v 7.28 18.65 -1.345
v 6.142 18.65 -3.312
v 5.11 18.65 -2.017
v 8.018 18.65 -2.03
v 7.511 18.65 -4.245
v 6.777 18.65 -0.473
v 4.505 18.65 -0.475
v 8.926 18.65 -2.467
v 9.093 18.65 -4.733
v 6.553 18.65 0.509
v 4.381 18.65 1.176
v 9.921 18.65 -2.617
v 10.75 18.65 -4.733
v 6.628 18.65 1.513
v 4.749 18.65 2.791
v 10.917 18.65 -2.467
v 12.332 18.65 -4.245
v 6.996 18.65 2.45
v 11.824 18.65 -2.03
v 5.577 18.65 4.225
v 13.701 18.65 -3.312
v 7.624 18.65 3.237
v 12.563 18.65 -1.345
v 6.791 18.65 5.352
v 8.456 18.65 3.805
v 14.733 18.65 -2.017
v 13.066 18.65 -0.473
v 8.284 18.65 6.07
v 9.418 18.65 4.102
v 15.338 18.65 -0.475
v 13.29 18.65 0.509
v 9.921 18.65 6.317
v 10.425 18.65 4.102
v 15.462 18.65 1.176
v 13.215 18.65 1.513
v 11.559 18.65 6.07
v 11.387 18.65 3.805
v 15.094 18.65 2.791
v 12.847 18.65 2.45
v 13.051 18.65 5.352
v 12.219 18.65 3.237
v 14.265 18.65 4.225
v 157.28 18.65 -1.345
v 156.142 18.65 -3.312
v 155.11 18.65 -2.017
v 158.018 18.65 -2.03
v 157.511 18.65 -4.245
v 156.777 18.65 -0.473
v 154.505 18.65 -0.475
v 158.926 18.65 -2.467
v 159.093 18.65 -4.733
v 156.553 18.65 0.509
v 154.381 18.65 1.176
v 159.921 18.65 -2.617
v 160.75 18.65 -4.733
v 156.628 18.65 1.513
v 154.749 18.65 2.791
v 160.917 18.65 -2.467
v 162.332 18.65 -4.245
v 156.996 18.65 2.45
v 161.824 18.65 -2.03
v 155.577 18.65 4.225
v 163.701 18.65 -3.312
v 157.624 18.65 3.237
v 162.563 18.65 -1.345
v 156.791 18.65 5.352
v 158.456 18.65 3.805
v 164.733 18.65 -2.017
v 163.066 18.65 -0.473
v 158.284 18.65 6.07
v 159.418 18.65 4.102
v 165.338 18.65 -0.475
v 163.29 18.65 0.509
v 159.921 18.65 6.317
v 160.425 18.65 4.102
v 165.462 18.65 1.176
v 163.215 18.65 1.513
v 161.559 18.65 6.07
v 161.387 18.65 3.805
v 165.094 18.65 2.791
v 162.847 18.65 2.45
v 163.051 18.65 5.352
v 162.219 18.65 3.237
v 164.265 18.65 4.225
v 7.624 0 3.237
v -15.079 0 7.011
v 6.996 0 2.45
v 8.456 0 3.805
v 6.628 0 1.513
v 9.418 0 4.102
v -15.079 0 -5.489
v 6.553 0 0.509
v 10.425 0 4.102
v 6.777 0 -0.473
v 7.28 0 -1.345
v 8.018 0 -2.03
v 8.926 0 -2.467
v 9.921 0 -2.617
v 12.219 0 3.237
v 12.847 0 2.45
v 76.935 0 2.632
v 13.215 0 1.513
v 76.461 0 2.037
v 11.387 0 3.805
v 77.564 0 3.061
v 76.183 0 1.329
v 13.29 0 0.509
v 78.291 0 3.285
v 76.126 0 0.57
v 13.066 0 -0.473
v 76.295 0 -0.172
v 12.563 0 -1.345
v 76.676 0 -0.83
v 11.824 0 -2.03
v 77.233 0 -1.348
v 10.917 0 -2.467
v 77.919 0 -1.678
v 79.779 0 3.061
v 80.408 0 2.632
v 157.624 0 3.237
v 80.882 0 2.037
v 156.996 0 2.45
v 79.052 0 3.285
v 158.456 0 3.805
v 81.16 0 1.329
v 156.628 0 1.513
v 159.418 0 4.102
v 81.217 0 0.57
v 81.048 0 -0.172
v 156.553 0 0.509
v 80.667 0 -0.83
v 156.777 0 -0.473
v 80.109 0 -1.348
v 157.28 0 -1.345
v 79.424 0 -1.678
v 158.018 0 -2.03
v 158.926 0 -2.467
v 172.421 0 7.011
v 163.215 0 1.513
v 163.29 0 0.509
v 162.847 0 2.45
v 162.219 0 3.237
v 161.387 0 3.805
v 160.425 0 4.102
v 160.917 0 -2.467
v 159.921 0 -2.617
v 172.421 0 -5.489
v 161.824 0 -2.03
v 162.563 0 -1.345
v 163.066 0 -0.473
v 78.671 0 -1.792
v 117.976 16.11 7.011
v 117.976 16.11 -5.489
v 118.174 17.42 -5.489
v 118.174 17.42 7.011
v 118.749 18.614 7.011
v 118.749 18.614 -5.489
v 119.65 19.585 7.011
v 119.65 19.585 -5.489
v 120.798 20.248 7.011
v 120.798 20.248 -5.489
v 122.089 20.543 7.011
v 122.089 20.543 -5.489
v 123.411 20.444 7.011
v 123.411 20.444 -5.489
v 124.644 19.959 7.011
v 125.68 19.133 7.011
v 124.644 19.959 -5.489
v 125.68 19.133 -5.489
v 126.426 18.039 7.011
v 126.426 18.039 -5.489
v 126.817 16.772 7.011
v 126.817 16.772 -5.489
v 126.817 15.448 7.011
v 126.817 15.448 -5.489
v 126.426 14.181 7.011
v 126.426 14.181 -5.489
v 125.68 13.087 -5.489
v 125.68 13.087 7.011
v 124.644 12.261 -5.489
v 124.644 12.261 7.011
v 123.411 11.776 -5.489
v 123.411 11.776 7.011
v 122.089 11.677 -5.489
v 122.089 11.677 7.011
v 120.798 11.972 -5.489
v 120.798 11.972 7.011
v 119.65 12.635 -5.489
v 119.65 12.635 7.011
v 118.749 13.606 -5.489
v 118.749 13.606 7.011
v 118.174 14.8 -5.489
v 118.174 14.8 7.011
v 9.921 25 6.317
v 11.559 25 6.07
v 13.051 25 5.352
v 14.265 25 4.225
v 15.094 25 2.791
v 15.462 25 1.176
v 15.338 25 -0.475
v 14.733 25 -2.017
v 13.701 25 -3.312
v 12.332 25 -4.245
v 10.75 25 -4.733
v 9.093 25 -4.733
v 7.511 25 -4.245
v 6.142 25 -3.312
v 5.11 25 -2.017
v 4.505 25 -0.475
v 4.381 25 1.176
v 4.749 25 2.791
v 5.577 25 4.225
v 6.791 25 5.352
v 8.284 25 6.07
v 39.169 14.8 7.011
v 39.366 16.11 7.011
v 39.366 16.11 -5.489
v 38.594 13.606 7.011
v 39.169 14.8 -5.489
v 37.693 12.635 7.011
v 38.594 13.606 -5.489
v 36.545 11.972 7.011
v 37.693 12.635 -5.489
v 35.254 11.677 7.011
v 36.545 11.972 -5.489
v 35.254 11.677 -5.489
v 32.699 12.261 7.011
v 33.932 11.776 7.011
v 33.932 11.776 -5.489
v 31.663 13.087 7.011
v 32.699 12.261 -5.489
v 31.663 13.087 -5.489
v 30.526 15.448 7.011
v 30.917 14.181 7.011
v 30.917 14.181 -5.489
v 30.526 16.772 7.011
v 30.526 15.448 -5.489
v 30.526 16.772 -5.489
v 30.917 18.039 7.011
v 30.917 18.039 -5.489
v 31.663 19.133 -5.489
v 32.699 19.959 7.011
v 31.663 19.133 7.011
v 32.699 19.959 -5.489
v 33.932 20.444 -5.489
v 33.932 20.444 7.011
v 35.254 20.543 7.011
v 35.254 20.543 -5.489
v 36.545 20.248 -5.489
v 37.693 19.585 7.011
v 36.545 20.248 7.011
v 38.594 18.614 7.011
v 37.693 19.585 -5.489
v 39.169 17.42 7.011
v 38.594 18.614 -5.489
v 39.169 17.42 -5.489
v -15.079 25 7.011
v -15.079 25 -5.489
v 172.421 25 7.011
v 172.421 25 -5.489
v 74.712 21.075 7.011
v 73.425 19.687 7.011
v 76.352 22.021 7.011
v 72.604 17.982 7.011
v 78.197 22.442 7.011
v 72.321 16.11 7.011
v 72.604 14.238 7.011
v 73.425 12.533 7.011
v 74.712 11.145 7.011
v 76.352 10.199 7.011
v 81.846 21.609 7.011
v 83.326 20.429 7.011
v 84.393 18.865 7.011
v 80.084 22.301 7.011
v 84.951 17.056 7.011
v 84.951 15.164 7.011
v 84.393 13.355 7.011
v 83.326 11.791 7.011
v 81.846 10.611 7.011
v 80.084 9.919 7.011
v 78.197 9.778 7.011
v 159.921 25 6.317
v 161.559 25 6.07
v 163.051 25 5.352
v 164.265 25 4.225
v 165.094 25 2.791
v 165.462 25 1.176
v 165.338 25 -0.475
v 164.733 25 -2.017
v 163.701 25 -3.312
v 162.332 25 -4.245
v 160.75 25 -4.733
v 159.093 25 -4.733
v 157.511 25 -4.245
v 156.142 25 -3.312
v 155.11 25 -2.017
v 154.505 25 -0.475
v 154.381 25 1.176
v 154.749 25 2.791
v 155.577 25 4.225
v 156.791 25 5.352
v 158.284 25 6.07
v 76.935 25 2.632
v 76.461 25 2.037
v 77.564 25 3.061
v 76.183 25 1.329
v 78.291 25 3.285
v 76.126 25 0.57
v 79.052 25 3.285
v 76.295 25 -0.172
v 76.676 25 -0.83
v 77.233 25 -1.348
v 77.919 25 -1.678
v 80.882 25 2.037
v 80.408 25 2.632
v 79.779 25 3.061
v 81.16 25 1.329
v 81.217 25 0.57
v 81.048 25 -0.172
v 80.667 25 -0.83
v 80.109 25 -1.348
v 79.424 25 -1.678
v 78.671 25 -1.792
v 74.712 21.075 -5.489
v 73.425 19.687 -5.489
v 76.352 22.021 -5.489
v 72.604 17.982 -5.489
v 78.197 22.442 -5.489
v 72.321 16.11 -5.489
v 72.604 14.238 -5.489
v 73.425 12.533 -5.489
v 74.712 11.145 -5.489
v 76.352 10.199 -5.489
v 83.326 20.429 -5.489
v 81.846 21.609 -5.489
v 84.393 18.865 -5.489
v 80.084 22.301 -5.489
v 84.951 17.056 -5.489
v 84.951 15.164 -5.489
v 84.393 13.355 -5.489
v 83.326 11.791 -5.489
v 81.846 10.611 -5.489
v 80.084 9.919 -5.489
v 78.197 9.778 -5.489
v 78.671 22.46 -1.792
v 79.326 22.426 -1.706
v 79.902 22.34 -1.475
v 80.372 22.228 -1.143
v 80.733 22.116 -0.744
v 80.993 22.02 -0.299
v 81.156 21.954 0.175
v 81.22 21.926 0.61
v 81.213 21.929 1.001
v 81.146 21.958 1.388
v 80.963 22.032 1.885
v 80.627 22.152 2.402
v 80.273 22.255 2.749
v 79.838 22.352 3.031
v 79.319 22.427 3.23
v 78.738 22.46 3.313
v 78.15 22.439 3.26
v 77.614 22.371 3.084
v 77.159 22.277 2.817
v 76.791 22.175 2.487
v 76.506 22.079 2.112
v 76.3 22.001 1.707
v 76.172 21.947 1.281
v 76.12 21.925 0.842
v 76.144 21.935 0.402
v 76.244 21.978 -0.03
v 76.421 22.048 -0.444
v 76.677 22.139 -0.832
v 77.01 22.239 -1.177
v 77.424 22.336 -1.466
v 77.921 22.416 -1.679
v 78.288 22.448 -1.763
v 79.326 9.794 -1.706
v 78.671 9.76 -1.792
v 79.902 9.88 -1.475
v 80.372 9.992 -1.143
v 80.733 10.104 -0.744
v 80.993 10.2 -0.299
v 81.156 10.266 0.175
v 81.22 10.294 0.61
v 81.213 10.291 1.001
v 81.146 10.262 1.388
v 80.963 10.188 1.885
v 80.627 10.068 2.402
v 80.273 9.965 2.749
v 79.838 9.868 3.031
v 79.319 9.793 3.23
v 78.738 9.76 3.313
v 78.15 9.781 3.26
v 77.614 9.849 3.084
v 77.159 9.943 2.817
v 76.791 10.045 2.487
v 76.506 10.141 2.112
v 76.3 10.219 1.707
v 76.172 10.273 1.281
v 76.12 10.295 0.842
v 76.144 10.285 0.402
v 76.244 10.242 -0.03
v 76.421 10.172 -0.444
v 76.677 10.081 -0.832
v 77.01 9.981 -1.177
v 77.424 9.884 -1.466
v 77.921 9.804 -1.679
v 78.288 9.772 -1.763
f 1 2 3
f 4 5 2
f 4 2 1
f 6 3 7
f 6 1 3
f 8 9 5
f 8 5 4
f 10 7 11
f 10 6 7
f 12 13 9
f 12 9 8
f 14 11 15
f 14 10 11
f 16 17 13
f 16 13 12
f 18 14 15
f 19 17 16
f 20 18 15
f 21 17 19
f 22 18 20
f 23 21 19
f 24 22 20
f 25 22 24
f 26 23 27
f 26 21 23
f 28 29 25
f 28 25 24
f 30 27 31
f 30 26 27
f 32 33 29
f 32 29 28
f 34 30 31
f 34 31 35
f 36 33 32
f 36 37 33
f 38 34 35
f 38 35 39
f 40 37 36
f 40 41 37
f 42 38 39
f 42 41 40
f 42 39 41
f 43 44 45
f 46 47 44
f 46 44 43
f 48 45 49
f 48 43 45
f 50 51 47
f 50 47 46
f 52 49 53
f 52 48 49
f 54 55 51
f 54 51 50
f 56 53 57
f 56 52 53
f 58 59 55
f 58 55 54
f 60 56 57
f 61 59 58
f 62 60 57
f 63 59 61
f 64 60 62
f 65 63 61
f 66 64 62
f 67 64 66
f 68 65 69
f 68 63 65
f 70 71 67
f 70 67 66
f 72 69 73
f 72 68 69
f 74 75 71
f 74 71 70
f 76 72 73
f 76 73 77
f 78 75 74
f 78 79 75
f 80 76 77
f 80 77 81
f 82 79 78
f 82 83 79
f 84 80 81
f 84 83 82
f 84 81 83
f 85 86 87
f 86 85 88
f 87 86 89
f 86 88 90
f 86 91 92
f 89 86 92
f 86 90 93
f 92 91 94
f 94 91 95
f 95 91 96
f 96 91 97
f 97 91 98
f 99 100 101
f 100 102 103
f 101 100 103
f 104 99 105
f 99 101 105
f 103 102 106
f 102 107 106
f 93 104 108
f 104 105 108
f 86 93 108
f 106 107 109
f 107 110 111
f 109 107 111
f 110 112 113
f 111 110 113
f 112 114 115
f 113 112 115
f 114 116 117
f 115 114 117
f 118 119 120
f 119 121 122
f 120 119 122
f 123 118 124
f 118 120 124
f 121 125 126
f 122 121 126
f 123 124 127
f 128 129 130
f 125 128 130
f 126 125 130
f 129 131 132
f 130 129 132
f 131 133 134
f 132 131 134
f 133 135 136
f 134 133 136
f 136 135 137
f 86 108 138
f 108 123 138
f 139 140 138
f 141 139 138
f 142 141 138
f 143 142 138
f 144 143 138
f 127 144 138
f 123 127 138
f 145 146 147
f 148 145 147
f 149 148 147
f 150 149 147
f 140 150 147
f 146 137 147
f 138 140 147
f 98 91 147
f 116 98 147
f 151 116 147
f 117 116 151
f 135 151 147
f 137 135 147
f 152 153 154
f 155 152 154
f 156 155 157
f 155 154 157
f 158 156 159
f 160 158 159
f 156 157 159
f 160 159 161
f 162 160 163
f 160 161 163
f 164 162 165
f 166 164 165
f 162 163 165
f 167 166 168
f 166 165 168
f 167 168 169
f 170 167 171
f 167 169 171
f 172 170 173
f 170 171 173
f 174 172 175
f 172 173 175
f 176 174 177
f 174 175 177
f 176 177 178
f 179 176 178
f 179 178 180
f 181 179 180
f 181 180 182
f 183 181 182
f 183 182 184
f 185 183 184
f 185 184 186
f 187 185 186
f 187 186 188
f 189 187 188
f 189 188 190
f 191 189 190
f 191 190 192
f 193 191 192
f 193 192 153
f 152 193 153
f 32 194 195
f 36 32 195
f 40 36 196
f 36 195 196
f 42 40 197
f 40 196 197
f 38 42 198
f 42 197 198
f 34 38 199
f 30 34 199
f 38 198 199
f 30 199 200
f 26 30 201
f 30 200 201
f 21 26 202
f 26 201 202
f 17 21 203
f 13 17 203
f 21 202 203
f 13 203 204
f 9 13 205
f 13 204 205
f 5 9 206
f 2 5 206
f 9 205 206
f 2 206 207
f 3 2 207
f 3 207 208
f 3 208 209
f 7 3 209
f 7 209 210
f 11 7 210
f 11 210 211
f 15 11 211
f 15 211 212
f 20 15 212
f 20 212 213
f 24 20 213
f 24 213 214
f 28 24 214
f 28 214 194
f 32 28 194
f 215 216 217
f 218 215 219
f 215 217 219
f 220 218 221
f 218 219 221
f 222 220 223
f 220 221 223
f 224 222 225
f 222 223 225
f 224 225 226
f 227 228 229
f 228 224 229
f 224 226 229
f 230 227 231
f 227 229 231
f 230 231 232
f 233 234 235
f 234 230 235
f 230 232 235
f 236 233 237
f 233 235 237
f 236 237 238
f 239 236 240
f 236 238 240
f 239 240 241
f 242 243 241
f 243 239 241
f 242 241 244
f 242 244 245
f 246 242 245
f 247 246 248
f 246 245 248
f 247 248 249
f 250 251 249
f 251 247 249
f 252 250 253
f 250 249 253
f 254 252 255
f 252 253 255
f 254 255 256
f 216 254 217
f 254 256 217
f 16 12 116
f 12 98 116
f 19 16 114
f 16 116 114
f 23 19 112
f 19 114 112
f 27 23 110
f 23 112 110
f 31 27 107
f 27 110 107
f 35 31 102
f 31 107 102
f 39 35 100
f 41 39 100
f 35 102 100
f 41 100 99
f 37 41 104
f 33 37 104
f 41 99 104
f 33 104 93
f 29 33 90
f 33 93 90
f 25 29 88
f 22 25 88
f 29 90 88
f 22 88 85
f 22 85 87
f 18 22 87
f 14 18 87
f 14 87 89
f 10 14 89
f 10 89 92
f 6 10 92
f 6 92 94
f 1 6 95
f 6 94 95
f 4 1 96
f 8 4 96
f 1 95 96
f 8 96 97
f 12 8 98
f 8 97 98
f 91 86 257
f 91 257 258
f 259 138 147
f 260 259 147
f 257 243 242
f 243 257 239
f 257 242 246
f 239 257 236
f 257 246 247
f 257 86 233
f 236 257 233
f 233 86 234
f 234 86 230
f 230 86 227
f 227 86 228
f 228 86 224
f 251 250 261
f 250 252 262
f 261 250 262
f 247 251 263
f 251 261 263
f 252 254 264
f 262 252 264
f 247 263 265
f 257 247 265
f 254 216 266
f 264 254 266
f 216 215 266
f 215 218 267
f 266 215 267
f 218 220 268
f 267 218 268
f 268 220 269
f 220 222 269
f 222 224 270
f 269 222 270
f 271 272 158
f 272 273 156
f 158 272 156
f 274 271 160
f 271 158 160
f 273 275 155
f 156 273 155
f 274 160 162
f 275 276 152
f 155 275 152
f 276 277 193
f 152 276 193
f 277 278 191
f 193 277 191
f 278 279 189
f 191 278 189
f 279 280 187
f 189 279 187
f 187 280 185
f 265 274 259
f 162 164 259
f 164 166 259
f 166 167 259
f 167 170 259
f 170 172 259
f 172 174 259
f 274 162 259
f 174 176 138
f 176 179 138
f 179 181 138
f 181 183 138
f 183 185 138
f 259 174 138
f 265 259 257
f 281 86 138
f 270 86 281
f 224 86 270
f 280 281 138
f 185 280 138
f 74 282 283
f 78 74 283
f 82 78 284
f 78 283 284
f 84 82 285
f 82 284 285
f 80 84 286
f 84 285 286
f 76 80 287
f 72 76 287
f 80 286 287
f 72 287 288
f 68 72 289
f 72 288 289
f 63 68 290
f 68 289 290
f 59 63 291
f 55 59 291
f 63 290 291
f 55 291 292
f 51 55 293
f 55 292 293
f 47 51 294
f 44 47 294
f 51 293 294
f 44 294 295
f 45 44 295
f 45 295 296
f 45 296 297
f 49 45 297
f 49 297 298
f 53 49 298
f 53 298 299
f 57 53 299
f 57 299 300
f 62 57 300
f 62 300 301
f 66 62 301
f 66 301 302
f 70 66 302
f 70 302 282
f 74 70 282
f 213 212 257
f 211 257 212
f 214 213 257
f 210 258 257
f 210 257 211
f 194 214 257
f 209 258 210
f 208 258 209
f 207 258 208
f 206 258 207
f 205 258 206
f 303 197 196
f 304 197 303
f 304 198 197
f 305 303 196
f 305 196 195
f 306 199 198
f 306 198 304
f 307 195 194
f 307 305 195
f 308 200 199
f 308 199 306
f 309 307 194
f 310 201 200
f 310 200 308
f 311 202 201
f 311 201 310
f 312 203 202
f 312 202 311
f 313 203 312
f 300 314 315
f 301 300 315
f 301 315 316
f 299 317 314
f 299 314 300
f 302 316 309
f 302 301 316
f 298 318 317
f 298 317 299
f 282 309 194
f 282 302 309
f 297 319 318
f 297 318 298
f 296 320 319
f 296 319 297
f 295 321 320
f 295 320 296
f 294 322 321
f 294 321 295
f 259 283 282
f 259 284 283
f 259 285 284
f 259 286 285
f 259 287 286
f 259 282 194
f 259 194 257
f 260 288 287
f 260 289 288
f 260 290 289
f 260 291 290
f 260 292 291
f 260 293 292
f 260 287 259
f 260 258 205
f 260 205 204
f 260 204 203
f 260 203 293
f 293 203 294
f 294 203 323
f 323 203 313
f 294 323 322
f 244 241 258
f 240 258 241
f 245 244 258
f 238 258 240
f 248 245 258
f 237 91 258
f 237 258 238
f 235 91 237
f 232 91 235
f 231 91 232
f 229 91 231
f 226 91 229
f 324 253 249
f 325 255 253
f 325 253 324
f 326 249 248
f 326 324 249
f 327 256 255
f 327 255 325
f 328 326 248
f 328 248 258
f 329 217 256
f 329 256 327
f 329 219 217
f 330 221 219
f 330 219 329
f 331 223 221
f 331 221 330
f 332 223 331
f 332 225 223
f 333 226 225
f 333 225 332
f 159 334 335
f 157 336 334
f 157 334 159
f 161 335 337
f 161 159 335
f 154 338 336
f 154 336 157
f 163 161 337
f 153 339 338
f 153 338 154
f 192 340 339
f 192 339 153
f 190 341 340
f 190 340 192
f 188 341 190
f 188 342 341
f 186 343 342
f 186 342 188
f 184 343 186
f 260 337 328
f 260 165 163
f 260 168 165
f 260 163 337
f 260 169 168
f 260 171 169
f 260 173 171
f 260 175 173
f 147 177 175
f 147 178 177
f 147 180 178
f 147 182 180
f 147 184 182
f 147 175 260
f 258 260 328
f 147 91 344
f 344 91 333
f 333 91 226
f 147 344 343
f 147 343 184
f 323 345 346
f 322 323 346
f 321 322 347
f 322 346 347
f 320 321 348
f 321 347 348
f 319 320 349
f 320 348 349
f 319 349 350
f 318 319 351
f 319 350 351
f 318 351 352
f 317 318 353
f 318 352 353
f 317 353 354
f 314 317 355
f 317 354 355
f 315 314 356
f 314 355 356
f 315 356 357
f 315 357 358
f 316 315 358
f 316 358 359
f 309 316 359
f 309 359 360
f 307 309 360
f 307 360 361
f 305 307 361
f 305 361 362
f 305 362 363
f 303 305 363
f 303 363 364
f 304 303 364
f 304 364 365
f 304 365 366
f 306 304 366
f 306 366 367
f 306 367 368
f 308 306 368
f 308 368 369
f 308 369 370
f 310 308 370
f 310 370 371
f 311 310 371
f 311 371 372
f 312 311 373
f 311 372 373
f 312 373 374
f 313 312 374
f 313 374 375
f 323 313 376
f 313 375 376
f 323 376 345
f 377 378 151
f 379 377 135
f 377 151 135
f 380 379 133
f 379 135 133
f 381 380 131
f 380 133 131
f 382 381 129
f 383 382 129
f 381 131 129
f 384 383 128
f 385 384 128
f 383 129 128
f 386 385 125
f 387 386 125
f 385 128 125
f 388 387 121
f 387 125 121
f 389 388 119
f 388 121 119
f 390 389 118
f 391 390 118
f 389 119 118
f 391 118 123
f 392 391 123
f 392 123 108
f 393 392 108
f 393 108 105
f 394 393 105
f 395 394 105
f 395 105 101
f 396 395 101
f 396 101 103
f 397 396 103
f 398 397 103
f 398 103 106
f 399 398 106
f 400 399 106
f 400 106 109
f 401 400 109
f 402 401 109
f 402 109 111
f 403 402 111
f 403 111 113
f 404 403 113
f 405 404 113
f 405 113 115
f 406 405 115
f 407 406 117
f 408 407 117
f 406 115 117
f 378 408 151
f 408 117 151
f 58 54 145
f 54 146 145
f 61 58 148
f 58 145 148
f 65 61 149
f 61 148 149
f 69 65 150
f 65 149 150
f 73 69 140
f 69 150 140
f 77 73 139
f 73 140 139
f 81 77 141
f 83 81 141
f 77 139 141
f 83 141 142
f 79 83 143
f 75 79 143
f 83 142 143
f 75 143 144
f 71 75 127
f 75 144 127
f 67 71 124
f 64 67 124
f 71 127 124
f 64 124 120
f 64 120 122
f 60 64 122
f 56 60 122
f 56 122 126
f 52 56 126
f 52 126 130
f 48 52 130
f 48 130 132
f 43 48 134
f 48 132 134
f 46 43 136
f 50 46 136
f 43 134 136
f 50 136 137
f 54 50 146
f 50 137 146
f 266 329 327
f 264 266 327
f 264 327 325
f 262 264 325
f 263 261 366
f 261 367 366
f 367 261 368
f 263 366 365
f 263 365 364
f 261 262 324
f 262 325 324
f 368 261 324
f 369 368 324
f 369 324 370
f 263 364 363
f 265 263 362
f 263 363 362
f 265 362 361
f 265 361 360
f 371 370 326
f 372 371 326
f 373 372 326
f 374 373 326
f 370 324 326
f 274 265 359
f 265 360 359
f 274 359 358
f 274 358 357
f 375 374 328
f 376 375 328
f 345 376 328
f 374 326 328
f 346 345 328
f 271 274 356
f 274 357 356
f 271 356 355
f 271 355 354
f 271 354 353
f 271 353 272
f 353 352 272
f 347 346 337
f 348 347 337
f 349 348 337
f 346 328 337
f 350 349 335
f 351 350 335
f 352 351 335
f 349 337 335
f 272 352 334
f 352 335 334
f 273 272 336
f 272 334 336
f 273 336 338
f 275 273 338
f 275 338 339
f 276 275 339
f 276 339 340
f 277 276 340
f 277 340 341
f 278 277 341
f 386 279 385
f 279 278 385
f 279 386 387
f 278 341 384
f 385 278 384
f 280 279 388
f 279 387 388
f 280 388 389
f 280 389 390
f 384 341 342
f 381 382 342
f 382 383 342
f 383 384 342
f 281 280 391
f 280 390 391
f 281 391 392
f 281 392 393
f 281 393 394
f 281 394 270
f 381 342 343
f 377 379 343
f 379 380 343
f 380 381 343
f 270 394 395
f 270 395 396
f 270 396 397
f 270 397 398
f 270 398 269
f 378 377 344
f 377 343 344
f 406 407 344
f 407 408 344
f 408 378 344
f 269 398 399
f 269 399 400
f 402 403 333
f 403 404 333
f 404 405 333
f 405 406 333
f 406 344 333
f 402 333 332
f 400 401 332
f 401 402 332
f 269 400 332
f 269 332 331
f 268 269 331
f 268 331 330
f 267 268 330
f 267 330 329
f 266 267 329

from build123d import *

# Parameters (mm, degrees)
SKETCH1_W                                        = 187.5
SKETCH1_H                                        = 12.5
BOSS_EXTRUDE1_DEPTH                              = 25
CBORE_FOR_1_4_SOCKET_HEAD_CAP_SCREW1_D           = 6.7564
CBORE_FOR_1_4_SOCKET_HEAD_CAP_SCREW1_CBORE_D     = 11.1125
CBORE_FOR_1_4_SOCKET_HEAD_CAP_SCREW1_CBORE_DEPTH = 6.35
CUT_EXTRUDE1_REACH                               = 176.672
SKETCH4_R                                        = 4.445
SKETCH4_R_2                                      = 6.35
F_1_4_20_TAPPED_HOLE1_D                          = 5.1054


with BuildPart() as part:
    # Sketch1 → Boss-Extrude1 (new body)
    with BuildSketch(Plane(origin=(0, 0, 0), x_dir=(1, 0, 0), z_dir=(0, 1, 0))):
        with Locations((78.671443618, -0.761090319)):
            Rectangle(SKETCH1_W, SKETCH1_H)
    extrude(amount=BOSS_EXTRUDE1_DEPTH)

    # CBORE for 1/4 Socket Head Cap Screw1 (through all)
    with Locations(Plane(origin=(9.921443618, 25, 0.761090319), x_dir=(0, 0, 1), z_dir=(0, 1, 0))):
        with Locations((0, 0), (0, 150.000000108)):
            CounterBoreHole(CBORE_FOR_1_4_SOCKET_HEAD_CAP_SCREW1_D / 2, CBORE_FOR_1_4_SOCKET_HEAD_CAP_SCREW1_CBORE_D / 2, CBORE_FOR_1_4_SOCKET_HEAD_CAP_SCREW1_CBORE_DEPTH)

    # Sketch4 → Cut-Extrude1 (cut, up to next)
    with BuildSketch(Plane(origin=(0, 0, -5.488909681), x_dir=(-1, 0, 0), z_dir=(0, 0, -1)), mode=Mode.PRIVATE) as cut_extrude1_sk1:
        with BuildLine():
            ThreePointArc((-30.476443618, 16.11), (-34.921443618, 20.555), (-39.366443618, 16.11))
            Line((-39.366443618, 16.11), (-30.476443618, 16.11))
        make_face()
    cut_extrude1_tool1 = extrude(cut_extrude1_sk1.sketch, amount=-CUT_EXTRUDE1_REACH, mode=Mode.PRIVATE) & part.part
    # Sketch4 → Cut-Extrude1 (cut, up to next)
    with BuildSketch(Plane(origin=(0, 0, -5.488909681), x_dir=(-1, 0, 0), z_dir=(0, 0, -1)), mode=Mode.PRIVATE) as cut_extrude1_sk2:
        with BuildLine():
            Line((-30.476443618, 16.11), (-39.366443618, 16.11))
            ThreePointArc((-39.366443618, 16.11), (-34.921443618, 11.665), (-30.476443618, 16.11))
        make_face()
    cut_extrude1_tool2 = extrude(cut_extrude1_sk2.sketch, amount=-CUT_EXTRUDE1_REACH, mode=Mode.PRIVATE) & part.part
    # Sketch4 → Cut-Extrude1 (cut, up to next)
    with BuildSketch(Plane(origin=(0, 0, -5.488909681), x_dir=(-1, 0, 0), z_dir=(0, 0, -1)), mode=Mode.PRIVATE) as cut_extrude1_sk3:
        with BuildLine():
            ThreePointArc((-30.476443618, 16.11), (-34.921443618, 20.555), (-39.366443618, 16.11))
            Line((-39.366443618, 16.11), (-30.476443618, 16.11))
        make_face()
    cut_extrude1_tool3 = extrude(cut_extrude1_sk3.sketch, amount=-CUT_EXTRUDE1_REACH, mode=Mode.PRIVATE) & part.part
    # Sketch4 → Cut-Extrude1 (cut, up to next)
    with BuildSketch(Plane(origin=(0, 0, -5.488909681), x_dir=(-1, 0, 0), z_dir=(0, 0, -1)), mode=Mode.PRIVATE) as cut_extrude1_sk4:
        with BuildLine():
            Line((-30.476443618, 16.11), (-39.366443618, 16.11))
            ThreePointArc((-39.366443618, 16.11), (-34.921443618, 11.665), (-30.476443618, 16.11))
        make_face()
    cut_extrude1_tool4 = extrude(cut_extrude1_sk4.sketch, amount=-CUT_EXTRUDE1_REACH, mode=Mode.PRIVATE) & part.part
    # Sketch4 → Cut-Extrude1 (cut, up to next)
    with BuildSketch(Plane(origin=(0, 0, -5.488909681), x_dir=(-1, 0, 0), z_dir=(0, 0, -1)), mode=Mode.PRIVATE) as cut_extrude1_sk5:
        with Locations((-122.421443618, 16.11)):
            Circle(SKETCH4_R)
    cut_extrude1_tool5 = extrude(cut_extrude1_sk5.sketch, amount=-CUT_EXTRUDE1_REACH, mode=Mode.PRIVATE) & part.part
    # Sketch4 → Cut-Extrude1 (cut, up to next)
    with BuildSketch(Plane(origin=(0, 0, -5.488909681), x_dir=(-1, 0, 0), z_dir=(0, 0, -1)), mode=Mode.PRIVATE) as cut_extrude1_sk6:
        with Locations((-78.671443618, 16.11)):
            Circle(SKETCH4_R_2)
    cut_extrude1_tool6 = extrude(cut_extrude1_sk6.sketch, amount=-CUT_EXTRUDE1_REACH, mode=Mode.PRIVATE) & part.part
    add(cut_extrude1_tool1.solids().sort_by_distance((34.921444, 17.996517, -5.48891))[0], mode=Mode.SUBTRACT)
    add(cut_extrude1_tool2.solids().sort_by_distance((34.921444, 14.223483, -5.48891))[0], mode=Mode.SUBTRACT)
    add(cut_extrude1_tool3.solids().sort_by_distance((34.921444, 17.996517, -5.48891))[0], mode=Mode.SUBTRACT)
    add(cut_extrude1_tool4.solids().sort_by_distance((34.921444, 14.223483, -5.48891))[0], mode=Mode.SUBTRACT)
    add(cut_extrude1_tool5.solids().sort_by_distance((122.421444, 16.11, -5.48891))[0], mode=Mode.SUBTRACT)
    add(cut_extrude1_tool6.solids().sort_by_distance((78.671444, 16.11, -5.48891))[0], mode=Mode.SUBTRACT)

    # 1/4-20 Tapped Hole1 (through all)
    with Locations(Plane(origin=(78.671443618, 25, 0.761090319), x_dir=(0, 0, 1), z_dir=(0, 1, 0))):
        with Locations((0, 0)):
            Hole(F_1_4_20_TAPPED_HOLE1_D / 2)


solid = part.part
